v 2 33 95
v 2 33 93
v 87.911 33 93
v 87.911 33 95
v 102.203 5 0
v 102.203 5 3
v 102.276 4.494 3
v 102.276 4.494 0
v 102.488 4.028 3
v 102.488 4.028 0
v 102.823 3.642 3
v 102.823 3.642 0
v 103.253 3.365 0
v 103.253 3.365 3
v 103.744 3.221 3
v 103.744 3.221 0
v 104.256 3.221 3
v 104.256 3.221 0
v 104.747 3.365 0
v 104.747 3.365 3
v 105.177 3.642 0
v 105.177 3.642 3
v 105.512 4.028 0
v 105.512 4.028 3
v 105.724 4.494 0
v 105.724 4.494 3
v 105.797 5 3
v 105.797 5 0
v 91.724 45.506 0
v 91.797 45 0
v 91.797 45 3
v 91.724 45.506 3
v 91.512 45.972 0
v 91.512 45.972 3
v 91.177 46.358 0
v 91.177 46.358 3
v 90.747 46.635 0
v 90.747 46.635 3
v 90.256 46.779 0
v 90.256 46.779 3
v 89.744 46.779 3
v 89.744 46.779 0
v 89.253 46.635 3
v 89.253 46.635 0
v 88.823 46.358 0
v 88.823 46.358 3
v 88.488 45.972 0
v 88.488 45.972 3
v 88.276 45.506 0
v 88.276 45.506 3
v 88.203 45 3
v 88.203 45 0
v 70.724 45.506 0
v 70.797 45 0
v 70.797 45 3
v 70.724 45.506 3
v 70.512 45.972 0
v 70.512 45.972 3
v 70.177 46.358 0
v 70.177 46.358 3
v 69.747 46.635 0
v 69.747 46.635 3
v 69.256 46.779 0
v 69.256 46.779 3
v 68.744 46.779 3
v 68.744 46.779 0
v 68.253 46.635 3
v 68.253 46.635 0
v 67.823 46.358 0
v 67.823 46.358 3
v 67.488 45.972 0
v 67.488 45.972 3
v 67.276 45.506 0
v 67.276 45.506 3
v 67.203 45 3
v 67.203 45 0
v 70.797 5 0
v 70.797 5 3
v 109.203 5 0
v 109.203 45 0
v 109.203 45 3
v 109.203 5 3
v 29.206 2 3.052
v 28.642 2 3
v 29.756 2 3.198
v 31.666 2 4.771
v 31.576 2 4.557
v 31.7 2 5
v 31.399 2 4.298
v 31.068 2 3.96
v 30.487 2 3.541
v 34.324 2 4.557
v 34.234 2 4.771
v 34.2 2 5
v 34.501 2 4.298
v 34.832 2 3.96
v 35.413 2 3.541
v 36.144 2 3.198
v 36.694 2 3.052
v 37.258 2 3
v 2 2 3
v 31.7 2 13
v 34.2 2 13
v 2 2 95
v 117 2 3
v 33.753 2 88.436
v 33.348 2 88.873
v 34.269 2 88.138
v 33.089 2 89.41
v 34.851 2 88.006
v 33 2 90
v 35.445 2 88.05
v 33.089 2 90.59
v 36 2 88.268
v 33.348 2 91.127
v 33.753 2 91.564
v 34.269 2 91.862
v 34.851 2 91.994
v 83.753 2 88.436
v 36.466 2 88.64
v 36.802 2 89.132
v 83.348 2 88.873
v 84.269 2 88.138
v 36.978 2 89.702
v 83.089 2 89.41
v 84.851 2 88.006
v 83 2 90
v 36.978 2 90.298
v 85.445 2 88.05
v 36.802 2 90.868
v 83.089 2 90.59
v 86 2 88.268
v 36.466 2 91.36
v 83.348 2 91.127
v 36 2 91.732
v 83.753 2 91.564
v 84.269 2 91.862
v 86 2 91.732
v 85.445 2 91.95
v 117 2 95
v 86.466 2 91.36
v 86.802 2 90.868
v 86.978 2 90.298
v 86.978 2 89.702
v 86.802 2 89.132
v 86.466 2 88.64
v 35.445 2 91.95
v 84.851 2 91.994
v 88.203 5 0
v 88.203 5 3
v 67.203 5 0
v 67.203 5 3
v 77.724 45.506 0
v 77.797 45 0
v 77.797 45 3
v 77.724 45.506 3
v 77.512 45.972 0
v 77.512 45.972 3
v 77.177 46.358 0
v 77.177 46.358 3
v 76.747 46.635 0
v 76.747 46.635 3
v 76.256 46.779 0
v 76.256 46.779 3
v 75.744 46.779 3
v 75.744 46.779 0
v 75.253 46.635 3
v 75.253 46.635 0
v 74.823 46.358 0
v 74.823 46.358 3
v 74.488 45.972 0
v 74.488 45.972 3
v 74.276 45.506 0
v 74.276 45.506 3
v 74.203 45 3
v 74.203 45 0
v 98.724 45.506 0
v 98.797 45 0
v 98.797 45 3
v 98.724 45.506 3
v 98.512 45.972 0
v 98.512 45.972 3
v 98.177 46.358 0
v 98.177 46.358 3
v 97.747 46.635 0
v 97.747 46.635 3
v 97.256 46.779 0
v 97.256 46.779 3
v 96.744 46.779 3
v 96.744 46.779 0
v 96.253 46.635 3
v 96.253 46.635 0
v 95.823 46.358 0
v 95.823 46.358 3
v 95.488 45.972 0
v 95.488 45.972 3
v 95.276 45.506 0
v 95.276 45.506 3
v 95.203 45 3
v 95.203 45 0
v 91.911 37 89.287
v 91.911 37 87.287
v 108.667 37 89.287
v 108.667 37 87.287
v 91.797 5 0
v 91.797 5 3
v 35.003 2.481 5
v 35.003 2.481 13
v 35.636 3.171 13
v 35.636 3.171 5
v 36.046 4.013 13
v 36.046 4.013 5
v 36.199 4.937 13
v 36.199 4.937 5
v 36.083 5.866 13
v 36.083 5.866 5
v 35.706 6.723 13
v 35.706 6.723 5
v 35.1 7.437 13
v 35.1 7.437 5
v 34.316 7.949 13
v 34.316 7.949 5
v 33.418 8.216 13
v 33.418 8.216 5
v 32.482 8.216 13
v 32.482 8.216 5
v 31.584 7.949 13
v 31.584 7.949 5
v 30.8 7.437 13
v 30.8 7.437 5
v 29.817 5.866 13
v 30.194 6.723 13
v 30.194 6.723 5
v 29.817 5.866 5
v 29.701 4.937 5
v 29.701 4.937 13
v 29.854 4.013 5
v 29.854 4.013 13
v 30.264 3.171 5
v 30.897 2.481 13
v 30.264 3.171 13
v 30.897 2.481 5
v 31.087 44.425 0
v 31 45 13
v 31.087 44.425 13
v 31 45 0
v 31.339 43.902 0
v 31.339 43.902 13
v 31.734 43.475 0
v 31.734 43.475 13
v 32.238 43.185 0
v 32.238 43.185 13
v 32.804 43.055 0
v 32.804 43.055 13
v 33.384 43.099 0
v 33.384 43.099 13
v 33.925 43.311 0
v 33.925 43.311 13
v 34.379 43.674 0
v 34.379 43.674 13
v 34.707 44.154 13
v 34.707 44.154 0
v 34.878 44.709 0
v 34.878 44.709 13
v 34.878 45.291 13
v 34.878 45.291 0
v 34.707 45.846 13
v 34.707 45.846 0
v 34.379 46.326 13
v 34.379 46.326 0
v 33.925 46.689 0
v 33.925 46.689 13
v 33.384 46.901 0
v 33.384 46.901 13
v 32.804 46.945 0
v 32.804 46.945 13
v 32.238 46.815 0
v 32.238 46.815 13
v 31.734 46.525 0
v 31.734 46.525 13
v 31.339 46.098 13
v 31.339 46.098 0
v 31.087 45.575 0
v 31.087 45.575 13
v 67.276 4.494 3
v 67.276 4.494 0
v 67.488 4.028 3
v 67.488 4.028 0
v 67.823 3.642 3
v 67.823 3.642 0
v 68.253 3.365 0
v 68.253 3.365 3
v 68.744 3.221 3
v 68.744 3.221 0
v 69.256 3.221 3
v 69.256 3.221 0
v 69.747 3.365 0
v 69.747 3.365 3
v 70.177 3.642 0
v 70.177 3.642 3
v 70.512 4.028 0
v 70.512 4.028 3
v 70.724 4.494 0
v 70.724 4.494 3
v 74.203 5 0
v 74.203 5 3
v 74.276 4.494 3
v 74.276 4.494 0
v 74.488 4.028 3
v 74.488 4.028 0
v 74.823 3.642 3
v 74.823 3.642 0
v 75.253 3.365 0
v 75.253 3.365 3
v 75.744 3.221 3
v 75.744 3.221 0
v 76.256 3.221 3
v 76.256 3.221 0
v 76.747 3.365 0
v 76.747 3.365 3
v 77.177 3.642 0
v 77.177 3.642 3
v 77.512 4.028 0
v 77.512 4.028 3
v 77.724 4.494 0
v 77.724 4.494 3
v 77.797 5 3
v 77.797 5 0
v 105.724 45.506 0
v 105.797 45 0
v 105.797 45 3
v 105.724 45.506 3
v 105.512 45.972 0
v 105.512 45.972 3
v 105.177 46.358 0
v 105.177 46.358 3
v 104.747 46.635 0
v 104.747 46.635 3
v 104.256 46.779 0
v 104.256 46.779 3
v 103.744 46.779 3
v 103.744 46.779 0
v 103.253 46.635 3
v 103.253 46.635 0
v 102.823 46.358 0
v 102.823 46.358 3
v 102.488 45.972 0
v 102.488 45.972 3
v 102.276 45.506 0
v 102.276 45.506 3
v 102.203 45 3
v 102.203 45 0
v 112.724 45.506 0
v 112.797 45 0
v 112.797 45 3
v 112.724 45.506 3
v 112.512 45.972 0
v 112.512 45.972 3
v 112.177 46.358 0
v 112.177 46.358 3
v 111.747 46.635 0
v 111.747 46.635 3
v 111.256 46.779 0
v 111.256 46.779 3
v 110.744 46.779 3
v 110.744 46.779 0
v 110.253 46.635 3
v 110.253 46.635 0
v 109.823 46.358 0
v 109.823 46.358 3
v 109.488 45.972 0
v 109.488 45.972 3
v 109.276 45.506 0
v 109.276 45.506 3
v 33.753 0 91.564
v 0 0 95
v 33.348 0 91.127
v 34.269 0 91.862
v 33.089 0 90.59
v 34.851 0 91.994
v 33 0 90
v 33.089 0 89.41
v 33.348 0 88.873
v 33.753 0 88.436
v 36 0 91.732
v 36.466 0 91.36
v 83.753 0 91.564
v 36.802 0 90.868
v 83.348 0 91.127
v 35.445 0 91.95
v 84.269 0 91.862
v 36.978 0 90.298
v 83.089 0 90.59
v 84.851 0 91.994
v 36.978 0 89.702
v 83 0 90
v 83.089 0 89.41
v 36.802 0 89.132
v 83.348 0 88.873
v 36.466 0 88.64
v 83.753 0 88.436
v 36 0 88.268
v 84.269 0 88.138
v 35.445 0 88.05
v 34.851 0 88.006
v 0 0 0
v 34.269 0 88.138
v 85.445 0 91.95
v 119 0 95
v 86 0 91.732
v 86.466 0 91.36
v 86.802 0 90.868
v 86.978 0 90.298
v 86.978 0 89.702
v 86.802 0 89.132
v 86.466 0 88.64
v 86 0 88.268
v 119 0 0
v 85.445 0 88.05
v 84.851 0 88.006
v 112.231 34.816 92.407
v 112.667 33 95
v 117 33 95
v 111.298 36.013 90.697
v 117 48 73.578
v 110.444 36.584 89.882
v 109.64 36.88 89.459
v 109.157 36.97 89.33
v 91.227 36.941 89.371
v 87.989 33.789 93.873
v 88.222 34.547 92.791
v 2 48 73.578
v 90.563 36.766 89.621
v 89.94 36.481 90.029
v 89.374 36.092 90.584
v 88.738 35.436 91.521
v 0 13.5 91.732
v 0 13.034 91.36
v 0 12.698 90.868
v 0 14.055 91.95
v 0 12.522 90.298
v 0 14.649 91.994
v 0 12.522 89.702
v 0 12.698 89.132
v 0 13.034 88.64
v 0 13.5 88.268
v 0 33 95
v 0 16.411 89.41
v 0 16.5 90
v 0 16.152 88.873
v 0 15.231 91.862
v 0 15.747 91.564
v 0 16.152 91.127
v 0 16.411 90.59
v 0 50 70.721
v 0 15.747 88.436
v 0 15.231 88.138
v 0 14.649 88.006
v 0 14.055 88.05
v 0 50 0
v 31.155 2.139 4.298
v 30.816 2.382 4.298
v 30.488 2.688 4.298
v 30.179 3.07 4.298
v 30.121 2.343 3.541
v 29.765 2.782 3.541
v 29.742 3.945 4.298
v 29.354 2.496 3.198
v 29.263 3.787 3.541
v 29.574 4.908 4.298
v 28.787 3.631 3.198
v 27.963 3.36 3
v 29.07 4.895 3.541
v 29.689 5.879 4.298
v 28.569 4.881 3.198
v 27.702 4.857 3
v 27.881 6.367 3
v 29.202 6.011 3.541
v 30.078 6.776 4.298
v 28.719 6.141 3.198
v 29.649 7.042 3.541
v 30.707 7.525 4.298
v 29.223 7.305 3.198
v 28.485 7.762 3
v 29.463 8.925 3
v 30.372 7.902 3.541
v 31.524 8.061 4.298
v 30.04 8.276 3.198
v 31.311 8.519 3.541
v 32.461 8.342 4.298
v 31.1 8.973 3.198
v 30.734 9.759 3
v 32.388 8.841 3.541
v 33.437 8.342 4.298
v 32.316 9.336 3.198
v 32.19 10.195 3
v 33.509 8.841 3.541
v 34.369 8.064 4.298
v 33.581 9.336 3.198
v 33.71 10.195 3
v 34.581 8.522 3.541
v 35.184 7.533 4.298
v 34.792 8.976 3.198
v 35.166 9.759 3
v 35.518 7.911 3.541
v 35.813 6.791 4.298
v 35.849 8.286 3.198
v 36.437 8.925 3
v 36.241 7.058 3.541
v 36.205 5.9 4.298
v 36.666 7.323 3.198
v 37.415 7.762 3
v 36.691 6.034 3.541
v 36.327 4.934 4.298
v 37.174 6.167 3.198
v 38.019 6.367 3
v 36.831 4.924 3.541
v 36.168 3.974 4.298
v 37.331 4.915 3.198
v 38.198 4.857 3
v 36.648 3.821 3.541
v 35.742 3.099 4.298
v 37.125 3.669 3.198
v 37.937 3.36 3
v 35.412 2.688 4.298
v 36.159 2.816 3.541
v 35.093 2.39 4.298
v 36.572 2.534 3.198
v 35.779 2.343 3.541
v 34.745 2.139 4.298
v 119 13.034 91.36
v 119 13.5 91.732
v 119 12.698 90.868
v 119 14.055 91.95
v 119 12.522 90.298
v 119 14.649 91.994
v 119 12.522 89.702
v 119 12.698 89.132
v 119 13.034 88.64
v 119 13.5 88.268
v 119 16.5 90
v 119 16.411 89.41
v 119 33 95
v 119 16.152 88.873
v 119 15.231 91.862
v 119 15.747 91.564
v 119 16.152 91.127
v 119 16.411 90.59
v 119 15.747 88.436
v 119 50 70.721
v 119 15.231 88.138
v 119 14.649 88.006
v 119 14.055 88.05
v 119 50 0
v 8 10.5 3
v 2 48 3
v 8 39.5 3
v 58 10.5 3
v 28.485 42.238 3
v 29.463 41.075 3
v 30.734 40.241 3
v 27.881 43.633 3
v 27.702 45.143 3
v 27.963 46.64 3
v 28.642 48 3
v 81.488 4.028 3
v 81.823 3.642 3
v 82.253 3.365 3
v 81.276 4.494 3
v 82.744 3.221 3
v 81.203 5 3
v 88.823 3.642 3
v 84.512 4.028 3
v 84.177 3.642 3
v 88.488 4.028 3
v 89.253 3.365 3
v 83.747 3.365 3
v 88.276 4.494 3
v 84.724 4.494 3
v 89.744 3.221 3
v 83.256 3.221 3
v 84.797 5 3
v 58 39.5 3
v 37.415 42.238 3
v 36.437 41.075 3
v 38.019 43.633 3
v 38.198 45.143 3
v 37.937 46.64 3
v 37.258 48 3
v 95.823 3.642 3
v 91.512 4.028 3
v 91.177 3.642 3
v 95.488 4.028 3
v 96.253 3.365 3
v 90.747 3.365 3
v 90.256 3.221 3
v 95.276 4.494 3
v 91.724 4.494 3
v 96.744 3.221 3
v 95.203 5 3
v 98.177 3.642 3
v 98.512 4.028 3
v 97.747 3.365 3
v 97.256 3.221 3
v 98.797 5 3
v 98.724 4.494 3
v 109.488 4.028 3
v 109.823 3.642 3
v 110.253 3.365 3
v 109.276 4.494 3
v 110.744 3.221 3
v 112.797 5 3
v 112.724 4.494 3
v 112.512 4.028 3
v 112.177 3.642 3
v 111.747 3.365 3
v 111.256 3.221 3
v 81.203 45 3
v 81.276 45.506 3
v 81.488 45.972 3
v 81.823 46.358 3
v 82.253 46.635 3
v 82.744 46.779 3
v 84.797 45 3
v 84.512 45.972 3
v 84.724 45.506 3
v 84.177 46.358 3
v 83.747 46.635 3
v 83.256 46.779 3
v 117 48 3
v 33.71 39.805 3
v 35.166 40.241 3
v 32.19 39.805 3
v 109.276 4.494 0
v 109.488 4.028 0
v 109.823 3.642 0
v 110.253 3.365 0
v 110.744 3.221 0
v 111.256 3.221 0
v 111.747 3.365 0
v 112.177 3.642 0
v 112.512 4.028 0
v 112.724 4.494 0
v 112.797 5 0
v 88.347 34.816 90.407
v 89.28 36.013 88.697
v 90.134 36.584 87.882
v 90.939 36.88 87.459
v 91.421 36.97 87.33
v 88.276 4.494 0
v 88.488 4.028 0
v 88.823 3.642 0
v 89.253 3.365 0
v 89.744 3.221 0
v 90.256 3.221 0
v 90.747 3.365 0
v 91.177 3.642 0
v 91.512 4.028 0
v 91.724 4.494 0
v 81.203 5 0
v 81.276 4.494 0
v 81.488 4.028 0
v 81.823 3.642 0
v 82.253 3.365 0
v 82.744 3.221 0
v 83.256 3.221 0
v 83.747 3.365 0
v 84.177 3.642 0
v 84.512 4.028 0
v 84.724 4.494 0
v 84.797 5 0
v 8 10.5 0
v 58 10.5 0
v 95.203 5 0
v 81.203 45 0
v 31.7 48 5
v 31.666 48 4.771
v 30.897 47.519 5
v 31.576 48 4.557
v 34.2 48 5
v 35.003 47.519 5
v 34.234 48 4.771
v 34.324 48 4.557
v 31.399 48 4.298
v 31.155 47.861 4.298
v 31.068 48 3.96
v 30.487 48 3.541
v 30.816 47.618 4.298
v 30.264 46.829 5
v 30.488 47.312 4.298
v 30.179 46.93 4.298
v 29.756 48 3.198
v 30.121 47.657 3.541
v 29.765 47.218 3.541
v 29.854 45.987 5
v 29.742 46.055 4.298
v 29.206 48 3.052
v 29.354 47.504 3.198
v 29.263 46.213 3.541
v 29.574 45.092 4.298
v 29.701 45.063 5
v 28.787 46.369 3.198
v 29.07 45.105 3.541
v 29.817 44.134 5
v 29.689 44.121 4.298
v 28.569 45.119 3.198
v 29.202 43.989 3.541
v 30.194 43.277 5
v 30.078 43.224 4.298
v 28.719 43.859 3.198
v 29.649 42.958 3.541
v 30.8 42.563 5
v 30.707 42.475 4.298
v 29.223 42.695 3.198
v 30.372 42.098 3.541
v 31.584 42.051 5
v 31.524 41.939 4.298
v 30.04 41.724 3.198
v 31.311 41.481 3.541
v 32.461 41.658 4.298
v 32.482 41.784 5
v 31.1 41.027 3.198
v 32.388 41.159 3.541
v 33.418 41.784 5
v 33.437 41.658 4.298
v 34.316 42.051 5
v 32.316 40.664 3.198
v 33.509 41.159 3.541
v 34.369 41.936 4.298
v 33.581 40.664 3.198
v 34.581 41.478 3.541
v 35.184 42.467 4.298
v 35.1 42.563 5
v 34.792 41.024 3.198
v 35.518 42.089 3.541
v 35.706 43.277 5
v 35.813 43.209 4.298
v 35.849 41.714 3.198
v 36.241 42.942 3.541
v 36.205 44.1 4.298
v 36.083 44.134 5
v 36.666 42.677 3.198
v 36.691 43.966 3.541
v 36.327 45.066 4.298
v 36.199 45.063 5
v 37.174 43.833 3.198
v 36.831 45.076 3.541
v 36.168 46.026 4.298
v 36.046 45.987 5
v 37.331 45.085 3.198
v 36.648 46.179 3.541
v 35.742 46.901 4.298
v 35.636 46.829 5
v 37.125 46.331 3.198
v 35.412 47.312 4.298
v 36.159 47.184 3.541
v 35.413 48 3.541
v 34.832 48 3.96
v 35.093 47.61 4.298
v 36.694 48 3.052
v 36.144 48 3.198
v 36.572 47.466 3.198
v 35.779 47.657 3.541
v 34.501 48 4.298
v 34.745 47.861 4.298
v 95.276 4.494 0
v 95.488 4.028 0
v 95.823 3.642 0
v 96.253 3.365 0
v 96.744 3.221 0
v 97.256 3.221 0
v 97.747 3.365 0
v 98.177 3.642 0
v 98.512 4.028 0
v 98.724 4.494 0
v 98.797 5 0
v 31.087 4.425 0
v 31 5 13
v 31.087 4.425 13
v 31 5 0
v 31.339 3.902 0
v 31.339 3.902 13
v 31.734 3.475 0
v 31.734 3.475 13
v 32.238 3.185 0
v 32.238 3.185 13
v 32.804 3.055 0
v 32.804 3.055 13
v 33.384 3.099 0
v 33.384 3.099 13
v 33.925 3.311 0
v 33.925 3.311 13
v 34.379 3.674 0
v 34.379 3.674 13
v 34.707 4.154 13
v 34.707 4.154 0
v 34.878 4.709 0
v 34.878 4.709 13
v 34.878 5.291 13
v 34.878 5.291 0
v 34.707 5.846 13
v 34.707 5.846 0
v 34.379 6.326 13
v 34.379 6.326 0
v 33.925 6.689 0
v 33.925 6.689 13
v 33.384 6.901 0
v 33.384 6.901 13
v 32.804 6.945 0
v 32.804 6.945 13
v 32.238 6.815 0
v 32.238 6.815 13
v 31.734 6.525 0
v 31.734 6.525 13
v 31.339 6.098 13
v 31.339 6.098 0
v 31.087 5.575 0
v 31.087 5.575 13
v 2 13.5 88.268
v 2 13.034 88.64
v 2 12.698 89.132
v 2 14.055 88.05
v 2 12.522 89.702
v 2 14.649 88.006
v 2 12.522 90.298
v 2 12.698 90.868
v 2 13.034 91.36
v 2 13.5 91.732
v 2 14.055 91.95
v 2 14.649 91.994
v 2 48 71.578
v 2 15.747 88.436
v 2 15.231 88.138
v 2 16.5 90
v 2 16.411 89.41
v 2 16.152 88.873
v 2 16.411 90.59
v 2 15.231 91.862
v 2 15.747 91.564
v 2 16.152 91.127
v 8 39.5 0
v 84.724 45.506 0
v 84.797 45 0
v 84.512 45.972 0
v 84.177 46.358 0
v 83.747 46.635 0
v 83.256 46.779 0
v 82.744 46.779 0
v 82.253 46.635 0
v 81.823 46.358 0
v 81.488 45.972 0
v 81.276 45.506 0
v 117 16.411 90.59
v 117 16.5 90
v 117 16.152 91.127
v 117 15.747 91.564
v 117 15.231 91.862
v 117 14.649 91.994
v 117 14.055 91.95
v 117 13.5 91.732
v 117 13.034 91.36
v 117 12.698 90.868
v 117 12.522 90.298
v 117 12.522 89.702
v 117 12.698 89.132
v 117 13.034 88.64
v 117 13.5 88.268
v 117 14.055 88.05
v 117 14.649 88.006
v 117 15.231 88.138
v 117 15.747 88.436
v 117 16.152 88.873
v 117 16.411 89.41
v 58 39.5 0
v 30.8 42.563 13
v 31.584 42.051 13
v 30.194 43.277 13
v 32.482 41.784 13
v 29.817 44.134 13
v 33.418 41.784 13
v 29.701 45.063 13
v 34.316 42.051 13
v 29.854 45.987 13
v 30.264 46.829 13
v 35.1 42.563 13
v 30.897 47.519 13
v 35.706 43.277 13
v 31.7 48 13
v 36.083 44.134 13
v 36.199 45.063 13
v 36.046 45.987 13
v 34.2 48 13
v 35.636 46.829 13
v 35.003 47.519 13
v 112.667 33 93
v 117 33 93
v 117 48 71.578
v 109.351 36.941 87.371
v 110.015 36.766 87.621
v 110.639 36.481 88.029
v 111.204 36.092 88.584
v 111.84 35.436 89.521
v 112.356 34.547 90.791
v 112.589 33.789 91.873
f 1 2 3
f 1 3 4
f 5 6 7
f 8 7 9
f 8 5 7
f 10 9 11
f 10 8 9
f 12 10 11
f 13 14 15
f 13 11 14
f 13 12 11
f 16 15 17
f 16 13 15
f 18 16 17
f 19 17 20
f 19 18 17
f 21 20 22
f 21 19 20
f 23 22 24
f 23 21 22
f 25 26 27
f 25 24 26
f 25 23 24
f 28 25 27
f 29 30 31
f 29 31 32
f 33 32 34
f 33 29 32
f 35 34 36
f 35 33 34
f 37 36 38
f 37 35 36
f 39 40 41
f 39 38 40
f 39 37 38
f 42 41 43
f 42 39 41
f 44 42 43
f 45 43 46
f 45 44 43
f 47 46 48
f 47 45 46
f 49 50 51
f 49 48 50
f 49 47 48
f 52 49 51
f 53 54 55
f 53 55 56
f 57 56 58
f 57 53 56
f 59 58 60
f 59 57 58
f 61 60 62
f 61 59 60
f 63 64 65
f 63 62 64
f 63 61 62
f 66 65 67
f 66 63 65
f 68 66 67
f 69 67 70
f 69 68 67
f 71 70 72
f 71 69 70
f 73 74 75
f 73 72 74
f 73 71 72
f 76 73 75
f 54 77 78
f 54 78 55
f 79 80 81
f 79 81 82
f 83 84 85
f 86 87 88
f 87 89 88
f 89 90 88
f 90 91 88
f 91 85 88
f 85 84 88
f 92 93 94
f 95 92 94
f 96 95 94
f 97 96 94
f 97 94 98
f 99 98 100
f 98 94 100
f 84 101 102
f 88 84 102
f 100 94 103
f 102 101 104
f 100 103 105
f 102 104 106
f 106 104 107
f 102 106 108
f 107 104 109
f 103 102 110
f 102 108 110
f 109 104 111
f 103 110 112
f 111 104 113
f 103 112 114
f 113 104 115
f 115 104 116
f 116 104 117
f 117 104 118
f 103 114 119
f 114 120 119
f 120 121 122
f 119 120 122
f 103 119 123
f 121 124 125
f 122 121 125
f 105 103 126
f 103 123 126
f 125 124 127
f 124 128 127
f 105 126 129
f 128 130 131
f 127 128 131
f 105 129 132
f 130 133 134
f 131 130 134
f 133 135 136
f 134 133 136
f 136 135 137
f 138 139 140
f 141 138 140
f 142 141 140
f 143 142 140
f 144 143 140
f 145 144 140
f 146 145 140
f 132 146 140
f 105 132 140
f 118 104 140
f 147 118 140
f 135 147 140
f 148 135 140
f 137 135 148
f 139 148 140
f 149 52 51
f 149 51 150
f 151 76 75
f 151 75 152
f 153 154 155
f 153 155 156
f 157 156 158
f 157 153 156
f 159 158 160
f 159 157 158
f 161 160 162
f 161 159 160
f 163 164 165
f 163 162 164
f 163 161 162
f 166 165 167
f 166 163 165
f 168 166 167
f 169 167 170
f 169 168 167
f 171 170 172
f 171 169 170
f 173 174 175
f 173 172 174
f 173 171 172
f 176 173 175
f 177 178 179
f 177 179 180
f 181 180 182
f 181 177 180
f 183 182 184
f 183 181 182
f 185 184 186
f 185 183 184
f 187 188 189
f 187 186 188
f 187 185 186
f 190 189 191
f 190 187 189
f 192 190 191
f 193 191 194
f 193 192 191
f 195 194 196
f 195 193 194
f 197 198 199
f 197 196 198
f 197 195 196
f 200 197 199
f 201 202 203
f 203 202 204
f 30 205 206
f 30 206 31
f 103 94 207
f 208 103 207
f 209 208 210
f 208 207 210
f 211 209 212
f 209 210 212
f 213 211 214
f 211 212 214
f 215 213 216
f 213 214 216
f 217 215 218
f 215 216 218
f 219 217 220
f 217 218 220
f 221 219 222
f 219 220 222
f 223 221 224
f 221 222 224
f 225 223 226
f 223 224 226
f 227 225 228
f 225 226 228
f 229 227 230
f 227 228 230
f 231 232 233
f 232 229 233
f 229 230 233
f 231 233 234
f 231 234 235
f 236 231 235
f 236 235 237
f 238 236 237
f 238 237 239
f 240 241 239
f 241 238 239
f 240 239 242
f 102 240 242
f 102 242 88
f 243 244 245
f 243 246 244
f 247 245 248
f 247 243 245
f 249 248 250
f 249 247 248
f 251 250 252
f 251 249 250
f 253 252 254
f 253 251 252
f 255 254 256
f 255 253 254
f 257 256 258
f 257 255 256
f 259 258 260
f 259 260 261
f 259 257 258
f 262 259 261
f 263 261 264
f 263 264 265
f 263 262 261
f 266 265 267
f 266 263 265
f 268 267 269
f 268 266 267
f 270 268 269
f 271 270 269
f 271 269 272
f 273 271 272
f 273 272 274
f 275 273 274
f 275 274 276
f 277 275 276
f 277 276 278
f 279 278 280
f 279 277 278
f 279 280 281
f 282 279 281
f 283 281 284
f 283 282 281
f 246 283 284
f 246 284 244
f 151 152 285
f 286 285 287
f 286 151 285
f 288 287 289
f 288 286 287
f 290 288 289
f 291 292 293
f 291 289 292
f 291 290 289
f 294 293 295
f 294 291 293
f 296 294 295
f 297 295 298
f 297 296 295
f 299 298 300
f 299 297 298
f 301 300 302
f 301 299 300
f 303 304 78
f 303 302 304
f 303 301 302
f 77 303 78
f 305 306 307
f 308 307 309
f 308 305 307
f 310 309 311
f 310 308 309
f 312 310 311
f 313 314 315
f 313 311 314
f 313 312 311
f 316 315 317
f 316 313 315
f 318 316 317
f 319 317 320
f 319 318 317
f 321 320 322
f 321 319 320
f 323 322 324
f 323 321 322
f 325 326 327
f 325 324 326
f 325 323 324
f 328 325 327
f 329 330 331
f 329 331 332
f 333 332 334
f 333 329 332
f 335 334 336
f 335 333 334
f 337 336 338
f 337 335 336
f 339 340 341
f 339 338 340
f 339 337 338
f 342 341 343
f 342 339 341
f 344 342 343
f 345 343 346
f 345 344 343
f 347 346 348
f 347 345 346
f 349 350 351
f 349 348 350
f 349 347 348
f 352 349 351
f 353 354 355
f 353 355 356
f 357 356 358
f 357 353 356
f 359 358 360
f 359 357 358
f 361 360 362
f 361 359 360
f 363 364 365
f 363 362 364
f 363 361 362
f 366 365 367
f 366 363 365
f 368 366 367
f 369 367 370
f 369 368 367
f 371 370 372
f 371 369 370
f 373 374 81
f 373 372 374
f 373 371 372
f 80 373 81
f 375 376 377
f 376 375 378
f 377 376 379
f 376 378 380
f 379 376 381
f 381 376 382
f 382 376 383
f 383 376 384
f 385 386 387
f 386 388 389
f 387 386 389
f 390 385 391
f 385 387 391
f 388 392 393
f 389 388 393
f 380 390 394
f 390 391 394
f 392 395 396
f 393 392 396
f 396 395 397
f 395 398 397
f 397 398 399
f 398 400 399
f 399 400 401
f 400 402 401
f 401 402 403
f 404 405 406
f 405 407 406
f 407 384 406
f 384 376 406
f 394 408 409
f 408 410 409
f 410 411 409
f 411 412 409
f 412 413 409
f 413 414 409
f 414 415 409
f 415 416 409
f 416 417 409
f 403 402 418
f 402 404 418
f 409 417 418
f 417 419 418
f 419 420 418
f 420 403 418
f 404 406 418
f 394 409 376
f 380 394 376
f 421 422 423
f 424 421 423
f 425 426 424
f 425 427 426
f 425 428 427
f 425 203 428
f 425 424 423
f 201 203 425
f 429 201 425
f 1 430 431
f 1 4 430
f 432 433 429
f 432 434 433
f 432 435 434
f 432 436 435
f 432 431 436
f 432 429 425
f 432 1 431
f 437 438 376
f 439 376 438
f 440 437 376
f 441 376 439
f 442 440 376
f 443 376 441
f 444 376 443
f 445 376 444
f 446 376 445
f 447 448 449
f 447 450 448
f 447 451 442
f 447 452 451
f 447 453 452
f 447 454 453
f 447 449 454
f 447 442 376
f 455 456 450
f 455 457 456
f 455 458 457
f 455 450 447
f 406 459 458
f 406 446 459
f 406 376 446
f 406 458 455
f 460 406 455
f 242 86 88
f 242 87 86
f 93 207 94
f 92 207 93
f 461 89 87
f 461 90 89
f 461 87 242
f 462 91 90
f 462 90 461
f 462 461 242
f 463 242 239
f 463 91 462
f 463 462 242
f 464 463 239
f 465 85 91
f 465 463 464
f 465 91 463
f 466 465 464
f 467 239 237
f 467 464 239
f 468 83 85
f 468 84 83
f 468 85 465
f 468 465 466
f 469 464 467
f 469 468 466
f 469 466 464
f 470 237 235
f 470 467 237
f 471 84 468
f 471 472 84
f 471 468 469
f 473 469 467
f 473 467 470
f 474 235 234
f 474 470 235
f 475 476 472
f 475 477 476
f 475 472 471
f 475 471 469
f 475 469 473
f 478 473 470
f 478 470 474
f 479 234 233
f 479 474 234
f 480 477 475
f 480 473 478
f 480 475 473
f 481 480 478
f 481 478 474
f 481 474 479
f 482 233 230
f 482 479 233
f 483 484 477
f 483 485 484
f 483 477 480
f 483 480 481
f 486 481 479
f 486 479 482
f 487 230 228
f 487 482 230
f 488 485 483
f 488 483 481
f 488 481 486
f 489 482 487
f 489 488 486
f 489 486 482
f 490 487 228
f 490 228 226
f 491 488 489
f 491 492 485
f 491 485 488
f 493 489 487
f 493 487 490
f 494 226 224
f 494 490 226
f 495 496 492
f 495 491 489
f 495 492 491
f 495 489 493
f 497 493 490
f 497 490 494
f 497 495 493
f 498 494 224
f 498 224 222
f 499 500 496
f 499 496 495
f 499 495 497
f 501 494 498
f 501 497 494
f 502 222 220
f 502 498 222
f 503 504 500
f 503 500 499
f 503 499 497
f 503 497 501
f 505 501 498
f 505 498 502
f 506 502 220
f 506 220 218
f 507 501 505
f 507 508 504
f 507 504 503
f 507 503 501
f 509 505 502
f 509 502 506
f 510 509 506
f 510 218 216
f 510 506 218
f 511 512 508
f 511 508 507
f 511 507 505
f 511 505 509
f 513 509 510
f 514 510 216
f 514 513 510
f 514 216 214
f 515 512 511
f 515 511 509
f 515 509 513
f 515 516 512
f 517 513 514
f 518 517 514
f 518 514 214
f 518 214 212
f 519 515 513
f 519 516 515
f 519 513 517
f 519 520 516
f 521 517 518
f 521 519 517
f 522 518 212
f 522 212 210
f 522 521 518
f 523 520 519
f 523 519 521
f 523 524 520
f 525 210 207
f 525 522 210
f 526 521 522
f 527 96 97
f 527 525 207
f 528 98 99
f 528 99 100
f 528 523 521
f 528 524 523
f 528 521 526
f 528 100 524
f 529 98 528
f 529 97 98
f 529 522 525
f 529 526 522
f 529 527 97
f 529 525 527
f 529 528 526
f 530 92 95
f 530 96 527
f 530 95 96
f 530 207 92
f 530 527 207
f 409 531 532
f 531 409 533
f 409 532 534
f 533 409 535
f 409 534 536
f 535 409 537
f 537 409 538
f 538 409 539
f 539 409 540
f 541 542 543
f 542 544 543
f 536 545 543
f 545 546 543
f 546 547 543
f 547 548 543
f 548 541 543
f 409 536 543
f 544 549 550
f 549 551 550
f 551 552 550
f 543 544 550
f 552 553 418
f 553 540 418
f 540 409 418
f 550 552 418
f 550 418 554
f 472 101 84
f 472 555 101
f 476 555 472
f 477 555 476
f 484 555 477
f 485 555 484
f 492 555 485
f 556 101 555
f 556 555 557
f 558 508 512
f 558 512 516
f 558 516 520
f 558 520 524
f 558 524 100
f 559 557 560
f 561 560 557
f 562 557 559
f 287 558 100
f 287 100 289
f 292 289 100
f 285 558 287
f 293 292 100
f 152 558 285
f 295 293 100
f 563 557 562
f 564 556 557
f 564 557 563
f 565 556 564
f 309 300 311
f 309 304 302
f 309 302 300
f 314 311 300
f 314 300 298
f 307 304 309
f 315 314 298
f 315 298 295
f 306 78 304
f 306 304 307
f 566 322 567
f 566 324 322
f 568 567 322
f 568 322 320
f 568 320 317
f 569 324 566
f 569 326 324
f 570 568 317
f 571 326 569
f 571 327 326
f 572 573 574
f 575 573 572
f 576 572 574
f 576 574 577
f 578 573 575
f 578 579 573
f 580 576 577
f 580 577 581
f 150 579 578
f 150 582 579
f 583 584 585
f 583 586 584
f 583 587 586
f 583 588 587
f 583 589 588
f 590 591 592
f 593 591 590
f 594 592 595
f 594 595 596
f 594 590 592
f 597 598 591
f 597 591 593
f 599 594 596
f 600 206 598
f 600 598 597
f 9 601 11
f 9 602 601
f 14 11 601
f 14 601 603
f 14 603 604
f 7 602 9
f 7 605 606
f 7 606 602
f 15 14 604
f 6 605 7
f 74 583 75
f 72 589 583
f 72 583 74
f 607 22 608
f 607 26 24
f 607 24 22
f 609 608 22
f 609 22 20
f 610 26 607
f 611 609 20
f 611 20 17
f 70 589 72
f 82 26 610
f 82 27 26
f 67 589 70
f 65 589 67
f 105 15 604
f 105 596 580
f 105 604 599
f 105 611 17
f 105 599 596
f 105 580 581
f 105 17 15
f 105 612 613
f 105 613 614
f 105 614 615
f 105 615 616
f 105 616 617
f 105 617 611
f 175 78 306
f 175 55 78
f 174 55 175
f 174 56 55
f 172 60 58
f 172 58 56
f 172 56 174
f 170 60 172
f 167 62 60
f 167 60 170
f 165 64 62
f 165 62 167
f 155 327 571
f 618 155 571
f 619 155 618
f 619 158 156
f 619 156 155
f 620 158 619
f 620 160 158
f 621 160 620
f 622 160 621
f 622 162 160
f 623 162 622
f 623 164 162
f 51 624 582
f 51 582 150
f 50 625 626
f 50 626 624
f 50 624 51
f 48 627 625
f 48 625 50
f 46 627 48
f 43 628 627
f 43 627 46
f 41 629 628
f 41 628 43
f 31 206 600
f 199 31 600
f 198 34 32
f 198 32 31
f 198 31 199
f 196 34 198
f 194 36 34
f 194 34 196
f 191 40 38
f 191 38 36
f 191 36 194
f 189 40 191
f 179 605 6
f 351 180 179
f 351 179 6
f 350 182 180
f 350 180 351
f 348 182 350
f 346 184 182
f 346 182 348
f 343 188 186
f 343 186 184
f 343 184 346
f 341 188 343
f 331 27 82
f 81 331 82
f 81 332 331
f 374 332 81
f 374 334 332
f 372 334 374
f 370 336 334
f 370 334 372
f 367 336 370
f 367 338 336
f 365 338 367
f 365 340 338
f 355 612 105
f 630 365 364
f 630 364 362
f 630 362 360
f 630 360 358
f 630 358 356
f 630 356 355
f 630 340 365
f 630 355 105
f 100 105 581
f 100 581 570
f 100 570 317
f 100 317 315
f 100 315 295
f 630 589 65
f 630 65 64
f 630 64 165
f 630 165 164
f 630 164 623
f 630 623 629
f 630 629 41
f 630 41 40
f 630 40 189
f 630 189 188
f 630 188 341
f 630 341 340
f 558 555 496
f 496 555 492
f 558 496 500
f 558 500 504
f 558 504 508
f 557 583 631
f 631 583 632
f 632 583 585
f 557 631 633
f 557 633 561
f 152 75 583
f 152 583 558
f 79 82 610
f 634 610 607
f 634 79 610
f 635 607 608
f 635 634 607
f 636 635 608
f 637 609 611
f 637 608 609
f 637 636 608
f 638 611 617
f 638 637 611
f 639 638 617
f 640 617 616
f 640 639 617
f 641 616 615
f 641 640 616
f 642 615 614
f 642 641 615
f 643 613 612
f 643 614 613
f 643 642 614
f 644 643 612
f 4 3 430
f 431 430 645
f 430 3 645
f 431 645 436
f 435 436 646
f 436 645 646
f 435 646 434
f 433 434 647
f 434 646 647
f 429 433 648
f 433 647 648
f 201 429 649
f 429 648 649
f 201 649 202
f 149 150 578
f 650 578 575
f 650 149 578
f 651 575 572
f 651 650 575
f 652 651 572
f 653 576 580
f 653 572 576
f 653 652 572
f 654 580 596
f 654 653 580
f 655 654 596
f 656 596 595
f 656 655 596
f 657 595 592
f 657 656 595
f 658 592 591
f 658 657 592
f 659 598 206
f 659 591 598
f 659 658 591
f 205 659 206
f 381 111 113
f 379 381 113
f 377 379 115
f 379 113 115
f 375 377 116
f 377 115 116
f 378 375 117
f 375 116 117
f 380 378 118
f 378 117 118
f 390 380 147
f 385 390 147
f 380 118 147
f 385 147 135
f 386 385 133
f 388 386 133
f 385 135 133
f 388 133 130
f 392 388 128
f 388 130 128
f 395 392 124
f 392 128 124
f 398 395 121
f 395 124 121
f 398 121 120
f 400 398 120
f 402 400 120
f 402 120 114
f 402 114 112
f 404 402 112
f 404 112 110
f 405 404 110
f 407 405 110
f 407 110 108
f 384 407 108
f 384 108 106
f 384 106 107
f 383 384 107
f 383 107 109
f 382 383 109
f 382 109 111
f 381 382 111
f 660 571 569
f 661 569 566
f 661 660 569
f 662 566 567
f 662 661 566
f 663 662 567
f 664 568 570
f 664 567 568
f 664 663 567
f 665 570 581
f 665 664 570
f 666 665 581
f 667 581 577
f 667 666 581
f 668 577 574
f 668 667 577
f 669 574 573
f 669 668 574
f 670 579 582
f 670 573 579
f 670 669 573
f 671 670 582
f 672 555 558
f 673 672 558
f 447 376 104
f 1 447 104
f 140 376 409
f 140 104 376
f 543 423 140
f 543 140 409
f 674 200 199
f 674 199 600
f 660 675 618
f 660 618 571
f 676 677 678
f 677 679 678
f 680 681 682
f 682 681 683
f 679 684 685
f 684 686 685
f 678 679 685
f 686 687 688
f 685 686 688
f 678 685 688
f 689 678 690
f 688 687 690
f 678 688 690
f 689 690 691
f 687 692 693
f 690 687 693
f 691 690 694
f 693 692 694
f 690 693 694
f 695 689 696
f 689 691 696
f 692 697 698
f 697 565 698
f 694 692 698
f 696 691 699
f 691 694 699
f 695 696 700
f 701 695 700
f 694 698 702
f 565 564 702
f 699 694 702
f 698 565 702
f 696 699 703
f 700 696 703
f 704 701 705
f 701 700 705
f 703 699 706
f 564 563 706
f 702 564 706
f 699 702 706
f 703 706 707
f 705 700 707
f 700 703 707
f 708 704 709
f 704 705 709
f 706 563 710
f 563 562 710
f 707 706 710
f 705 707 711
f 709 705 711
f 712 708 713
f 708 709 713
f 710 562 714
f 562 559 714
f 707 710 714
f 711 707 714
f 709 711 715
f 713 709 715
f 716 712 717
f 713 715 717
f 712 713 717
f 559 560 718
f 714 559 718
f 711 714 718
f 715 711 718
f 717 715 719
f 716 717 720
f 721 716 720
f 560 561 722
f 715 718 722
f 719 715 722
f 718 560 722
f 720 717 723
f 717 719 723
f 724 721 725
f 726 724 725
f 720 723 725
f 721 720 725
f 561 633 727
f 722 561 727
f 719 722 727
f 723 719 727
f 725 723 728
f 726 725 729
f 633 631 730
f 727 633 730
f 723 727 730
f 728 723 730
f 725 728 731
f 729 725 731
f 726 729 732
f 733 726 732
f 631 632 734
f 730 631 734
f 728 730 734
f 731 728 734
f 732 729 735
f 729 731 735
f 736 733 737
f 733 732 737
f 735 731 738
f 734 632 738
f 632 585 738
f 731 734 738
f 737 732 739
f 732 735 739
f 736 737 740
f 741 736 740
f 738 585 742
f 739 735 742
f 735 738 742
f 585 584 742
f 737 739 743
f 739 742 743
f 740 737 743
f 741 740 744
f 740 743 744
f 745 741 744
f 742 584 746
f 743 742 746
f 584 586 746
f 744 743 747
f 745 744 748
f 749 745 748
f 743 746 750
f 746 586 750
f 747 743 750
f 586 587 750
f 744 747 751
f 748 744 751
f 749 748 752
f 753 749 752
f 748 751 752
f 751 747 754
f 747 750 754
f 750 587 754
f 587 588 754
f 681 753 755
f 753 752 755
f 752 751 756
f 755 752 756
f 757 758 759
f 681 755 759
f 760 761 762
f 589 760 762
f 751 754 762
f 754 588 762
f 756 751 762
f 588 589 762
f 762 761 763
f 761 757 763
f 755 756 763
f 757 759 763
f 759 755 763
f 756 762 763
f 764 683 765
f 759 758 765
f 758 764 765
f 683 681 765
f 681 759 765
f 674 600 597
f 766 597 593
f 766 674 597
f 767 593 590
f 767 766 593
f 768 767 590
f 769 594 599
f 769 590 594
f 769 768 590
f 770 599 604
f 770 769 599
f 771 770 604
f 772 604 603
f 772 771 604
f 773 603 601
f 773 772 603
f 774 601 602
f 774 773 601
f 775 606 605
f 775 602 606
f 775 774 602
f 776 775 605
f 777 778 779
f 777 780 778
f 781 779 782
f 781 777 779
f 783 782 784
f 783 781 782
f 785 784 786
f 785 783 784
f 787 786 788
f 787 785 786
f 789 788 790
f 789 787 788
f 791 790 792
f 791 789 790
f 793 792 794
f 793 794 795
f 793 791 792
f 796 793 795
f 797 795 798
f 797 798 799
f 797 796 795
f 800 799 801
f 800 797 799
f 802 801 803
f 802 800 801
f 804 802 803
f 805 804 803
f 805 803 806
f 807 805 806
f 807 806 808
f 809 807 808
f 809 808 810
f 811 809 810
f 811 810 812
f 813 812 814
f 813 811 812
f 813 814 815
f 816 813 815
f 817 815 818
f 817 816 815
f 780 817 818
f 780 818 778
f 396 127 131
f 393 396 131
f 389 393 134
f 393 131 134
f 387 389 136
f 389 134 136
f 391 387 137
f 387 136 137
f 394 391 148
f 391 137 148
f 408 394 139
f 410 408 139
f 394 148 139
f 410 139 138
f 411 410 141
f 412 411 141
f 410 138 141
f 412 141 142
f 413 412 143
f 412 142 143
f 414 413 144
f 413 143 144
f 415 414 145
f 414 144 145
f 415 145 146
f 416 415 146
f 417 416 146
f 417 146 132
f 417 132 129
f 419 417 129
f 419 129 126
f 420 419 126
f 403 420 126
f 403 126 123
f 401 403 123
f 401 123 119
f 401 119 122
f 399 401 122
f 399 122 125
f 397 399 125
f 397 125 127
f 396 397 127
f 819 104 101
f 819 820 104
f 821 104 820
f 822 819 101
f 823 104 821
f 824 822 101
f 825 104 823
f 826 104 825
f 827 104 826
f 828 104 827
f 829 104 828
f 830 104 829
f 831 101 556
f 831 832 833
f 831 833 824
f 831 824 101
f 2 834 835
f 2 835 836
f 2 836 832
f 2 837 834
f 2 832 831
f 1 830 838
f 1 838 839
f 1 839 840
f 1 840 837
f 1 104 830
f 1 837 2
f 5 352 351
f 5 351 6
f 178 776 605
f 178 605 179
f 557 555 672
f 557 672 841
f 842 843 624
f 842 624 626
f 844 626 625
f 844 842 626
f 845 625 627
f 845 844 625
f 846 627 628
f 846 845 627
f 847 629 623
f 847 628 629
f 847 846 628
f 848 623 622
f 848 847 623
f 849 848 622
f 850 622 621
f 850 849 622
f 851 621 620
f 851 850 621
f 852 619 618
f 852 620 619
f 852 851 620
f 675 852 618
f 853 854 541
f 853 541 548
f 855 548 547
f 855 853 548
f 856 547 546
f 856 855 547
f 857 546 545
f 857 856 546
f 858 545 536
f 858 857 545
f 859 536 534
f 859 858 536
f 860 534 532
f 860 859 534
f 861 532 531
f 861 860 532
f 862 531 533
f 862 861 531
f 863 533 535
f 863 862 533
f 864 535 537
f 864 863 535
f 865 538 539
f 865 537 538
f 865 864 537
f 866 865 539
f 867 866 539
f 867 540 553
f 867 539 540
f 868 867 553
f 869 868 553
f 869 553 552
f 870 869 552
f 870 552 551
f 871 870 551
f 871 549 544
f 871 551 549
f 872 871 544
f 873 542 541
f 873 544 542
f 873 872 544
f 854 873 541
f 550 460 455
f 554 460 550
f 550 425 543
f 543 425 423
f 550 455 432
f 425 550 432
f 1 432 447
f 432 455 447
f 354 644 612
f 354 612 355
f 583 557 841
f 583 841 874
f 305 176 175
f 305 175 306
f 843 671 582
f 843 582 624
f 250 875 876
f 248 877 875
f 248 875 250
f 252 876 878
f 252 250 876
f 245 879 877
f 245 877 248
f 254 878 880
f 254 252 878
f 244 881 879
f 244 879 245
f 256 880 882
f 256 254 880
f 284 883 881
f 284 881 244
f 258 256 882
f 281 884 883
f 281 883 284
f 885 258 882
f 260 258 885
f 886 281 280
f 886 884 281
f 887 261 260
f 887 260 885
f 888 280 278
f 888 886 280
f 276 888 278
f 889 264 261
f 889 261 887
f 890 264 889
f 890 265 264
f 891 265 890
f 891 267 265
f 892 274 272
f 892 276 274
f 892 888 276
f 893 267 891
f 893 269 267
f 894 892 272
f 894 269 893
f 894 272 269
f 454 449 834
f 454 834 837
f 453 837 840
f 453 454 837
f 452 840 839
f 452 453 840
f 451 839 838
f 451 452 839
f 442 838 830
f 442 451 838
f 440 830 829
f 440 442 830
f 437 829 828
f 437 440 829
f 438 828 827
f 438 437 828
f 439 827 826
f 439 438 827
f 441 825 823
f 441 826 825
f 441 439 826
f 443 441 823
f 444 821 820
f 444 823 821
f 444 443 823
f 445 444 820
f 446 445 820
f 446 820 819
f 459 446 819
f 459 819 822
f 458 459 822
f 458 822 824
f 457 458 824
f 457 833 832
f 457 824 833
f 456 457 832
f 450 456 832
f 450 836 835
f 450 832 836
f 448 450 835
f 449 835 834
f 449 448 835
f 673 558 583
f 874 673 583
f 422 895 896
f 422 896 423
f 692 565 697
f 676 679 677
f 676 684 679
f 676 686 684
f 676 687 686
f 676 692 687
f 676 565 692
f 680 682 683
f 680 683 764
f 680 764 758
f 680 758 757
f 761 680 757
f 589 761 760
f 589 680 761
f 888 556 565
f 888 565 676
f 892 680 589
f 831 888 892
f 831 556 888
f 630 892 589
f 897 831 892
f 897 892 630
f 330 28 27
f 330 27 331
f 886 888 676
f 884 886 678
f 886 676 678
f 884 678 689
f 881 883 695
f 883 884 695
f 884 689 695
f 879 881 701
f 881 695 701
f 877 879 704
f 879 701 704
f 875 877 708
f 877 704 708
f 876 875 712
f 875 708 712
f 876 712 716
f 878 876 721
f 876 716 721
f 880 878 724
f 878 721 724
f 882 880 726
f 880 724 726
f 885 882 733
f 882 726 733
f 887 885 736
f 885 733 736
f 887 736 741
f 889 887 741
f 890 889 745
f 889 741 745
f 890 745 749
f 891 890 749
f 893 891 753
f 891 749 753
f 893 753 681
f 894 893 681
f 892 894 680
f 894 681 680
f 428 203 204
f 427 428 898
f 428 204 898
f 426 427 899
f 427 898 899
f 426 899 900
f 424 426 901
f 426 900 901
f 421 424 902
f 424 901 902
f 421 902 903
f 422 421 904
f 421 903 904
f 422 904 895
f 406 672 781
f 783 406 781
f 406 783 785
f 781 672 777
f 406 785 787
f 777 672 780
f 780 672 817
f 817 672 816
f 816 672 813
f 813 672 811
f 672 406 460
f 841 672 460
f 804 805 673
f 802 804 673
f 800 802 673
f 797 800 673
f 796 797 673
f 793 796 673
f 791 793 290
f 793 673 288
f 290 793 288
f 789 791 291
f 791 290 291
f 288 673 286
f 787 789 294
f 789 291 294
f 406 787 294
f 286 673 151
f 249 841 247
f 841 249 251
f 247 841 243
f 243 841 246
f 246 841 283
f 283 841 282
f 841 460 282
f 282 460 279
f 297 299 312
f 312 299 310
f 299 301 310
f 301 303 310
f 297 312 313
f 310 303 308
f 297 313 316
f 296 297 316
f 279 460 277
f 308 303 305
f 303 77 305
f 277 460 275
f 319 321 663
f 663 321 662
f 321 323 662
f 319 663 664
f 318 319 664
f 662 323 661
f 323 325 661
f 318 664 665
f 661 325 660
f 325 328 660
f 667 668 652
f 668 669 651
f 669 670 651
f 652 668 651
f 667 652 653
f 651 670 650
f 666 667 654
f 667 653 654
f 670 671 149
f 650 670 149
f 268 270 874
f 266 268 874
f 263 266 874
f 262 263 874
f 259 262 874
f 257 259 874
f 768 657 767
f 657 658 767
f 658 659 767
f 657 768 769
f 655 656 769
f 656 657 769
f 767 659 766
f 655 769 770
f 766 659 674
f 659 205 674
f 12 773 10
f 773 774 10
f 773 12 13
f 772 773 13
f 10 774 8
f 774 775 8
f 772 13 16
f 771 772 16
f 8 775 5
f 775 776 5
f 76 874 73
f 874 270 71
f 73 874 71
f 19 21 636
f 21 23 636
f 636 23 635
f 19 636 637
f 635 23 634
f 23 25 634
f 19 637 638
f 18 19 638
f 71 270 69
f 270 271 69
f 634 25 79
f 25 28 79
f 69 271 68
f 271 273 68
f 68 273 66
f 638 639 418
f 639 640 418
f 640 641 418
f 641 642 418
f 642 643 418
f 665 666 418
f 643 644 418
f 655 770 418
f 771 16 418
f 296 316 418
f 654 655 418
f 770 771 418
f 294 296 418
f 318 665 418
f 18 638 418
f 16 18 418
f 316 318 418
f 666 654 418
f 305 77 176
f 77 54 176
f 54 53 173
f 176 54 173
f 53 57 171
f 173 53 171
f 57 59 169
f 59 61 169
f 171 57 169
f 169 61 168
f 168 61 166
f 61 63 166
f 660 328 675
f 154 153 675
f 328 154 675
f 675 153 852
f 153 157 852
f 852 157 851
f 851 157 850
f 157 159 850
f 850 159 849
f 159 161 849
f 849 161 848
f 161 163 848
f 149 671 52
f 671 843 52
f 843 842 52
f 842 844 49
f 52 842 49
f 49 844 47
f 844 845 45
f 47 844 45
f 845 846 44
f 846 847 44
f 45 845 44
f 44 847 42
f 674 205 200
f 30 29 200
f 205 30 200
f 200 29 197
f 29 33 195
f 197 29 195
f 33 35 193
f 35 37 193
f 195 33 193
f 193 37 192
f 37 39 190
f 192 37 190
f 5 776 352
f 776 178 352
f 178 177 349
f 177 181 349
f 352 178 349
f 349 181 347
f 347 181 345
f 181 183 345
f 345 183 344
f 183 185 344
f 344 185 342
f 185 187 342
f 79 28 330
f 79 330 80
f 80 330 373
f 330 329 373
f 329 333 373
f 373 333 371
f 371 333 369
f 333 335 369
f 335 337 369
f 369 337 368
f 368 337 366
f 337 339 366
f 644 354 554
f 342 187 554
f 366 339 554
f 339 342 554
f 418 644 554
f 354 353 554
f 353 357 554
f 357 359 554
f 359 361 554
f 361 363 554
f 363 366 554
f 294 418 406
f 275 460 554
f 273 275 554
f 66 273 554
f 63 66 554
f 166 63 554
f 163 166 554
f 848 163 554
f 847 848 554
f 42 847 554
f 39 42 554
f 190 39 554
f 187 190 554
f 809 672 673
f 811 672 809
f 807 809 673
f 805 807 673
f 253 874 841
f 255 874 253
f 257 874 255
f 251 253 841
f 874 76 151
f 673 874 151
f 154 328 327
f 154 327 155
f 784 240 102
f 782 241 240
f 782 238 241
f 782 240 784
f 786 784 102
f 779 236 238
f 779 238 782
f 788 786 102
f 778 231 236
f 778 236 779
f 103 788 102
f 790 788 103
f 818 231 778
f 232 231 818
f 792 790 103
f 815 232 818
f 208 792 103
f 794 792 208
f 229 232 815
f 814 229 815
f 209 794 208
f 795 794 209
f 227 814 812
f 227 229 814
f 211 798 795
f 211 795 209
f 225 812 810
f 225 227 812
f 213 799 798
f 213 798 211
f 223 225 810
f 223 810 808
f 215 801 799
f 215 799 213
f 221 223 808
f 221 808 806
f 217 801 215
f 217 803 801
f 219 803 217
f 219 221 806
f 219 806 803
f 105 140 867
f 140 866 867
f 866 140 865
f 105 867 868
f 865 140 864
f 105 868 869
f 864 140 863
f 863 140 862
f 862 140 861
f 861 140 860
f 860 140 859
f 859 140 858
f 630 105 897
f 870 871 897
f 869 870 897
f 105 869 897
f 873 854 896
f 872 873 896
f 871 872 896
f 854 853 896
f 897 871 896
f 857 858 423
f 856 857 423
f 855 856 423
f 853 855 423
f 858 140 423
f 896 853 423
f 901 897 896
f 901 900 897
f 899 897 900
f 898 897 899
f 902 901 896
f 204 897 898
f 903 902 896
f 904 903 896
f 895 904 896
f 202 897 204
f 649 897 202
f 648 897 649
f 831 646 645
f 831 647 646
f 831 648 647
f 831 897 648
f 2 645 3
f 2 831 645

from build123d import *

# Parameters (mm, degrees)
SKETCH1_W               = 119
SKETCH1_H               = 50
BOSS_EXTRUDE1_DEPTH     = 95
SKETCH2_W               = 115
SKETCH2_H               = 46
CUT_EXTRUDE1_DEPTH      = 92
SKETCH3_W               = 50
SKETCH3_H               = 29
CUT_EXTRUDE2_DEPTH      = 10
SKETCH4_R               = 1.95
CUT_EXTRUDE3_DEPTH      = 10
SKETCH5_R               = 3.25
SKETCH5_R_2             = 1.95
BOSS_EXTRUDE3_DEPTH     = 10
FILLET1_R               = 2
SKETCH6_R               = 2
CUT_EXTRUDE4_DEPTH      = 10
CUT_EXTRUDE5_DEPTH      = 159.789168456
CUT_EXTRUDE5_DEPTH_BACK = 159.789168456
SKETCH8_R               = 2
BOSS_EXTRUDE4_DEPTH     = 115
CUT_EXTRUDE6_DEPTH      = 159.789168456
CUT_EXTRUDE6_DEPTH_BACK = 159.789168456
CUT_EXTRUDE8_DEPTH      = 10
CUT_EXTRUDE9_DEPTH      = 155.550962524


with BuildPart() as part:
    # Sketch1 → Boss-Extrude1 (new body)
    with BuildSketch(Plane.XY):
        with Locations((59.5, 25)):
            Rectangle(SKETCH1_W, SKETCH1_H)
    extrude(amount=BOSS_EXTRUDE1_DEPTH)

    # Sketch2 → Cut-Extrude1 (cut)
    with BuildSketch(Plane.XY.offset(95)):
        with Locations((59.5, 25)):
            Rectangle(SKETCH2_W, SKETCH2_H)
    extrude(amount=-CUT_EXTRUDE1_DEPTH, mode=Mode.SUBTRACT)

    # Sketch3 → Cut-Extrude2 (cut)
    with BuildSketch(Plane.XY.offset(3)):
        with Locations((33, 25)):
            Rectangle(SKETCH3_W, SKETCH3_H)
    extrude(amount=-CUT_EXTRUDE2_DEPTH, mode=Mode.SUBTRACT)

    # Sketch4 → Cut-Extrude3 (cut)
    with BuildSketch(Plane(origin=(0, 0, 0), x_dir=(-1, 0, 0), z_dir=(0, 0, -1))):
        with Locations((-32.95, 45)):
            Circle(SKETCH4_R)
        with Locations((-32.95, 5)):
            Circle(SKETCH4_R)
    extrude(amount=-CUT_EXTRUDE3_DEPTH, mode=Mode.SUBTRACT)

    # Sketch5 → Boss-Extrude3 (add)
    # profile 1 of 2: a face of its own
    with BuildSketch(Plane.XY.offset(3)):
        with Locations((32.95, 45)):
            Circle(SKETCH5_R)
        with Locations(Location((32.95, 45, 0), (0, 0, 180))):
            Circle(SKETCH5_R_2, mode=Mode.SUBTRACT)
    # profile 2 of 2: a face of its own
    with BuildSketch(Plane.XY.offset(3)):
        with Locations((32.95, 5)):
            Circle(SKETCH5_R)
        with Locations(Location((32.95, 5, 0), (0, 0, 180))):
            Circle(SKETCH5_R_2, mode=Mode.SUBTRACT)
    extrude(amount=BOSS_EXTRUDE3_DEPTH)

    # Fillet1
    fillet1_edges = [part.edges().sort_by_distance(p)[0] for p in [
        (31.147224362, 42.295836543, 3),
        (31.147224362, 7.704163457, 3),
    ]]
    fillet(fillet1_edges, radius=FILLET1_R)

    # Sketch6 → Cut-Extrude4 (cut)
    with BuildSketch(Plane(origin=(0, 2, 0), x_dir=(1, 0, 0), z_dir=(0, 1, 0))):
        with Locations(Location((85, -90, 0), (0, 0, 180))):
            Circle(SKETCH6_R)
        with Locations(Location((35, -90, 0), (0, 0, 180))):
            Circle(SKETCH6_R)
    extrude(amount=-CUT_EXTRUDE4_DEPTH, mode=Mode.SUBTRACT)

    # Sketch8 → Cut-Extrude5 (cut, two sides: drawn at the far end of the back side and taken through both)
    with BuildSketch(Plane(origin=(2, 0, 0), x_dir=(0, 0, -1), z_dir=(1, 0, 0)).offset(-CUT_EXTRUDE5_DEPTH_BACK)):
        with Locations(Location((-90, 14.5, 0), (0, 0, 90))):
            Circle(SKETCH8_R)
    extrude(amount=CUT_EXTRUDE5_DEPTH + CUT_EXTRUDE5_DEPTH_BACK, mode=Mode.SUBTRACT)

    # Sketch9 → Boss-Extrude4 (add)
    with BuildSketch(Plane(origin=(2, 0, 0), x_dir=(0, 0, -1), z_dir=(1, 0, 0))):
        Polygon((-95, 33), (-73.577779899, 48), (-71.577779899, 48), (-93, 33), align=None)
    extrude(amount=BOSS_EXTRUDE4_DEPTH)

    # Sketch10 → Cut-Extrude6 (cut, two sides: drawn at the far end of the back side and taken through both)
    with BuildSketch(Plane(origin=(2, 0, 0), x_dir=(0, 0, -1), z_dir=(1, 0, 0)).offset(-CUT_EXTRUDE6_DEPTH_BACK)):
        Polygon((-95, 33), (-95, 50), (-70.721483885, 50), align=None)
    extrude(amount=CUT_EXTRUDE6_DEPTH + CUT_EXTRUDE6_DEPTH_BACK, mode=Mode.SUBTRACT)

    # Sketch11 → Cut-Extrude8 (cut)
    with BuildSketch(Plane(origin=(0, 0, 0), x_dir=(-1, 0, 0), z_dir=(0, 0, -1))):
        with BuildLine():
            Line((-109.202811856, 45), (-109.202811856, 5))
            ThreePointArc((-109.202811856, 5), (-111, 3.202811856), (-112.797188144, 5))
            Line((-112.797188144, 5), (-112.797188144, 45))
            ThreePointArc((-112.797188144, 45), (-111, 46.797188144), (-109.202811856, 45))
        make_face()
        with BuildLine():
            Line((-102.202811856, 45), (-102.202811856, 5))
            ThreePointArc((-102.202811856, 5), (-104, 3.202811856), (-105.797188144, 5))
            Line((-105.797188144, 5), (-105.797188144, 45))
            ThreePointArc((-105.797188144, 45), (-104, 46.797188144), (-102.202811856, 45))
        make_face()
        with BuildLine():
            Line((-95.202811856, 45), (-95.202811856, 5))
            ThreePointArc((-95.202811856, 5), (-97, 3.202811856), (-98.797188144, 5))
            Line((-98.797188144, 5), (-98.797188144, 45))
            ThreePointArc((-98.797188144, 45), (-97, 46.797188144), (-95.202811856, 45))
        make_face()
        with BuildLine():
            Line((-88.202811856, 45), (-88.202811856, 5))
            ThreePointArc((-88.202811856, 5), (-90, 3.202811856), (-91.797188144, 5))
            Line((-91.797188144, 5), (-91.797188144, 45))
            ThreePointArc((-91.797188144, 45), (-90, 46.797188144), (-88.202811856, 45))
        make_face()
        with BuildLine():
            Line((-81.202811856, 45), (-81.202811856, 5))
            ThreePointArc((-81.202811856, 5), (-83, 3.202811856), (-84.797188144, 5))
            Line((-84.797188144, 5), (-84.797188144, 45))
            ThreePointArc((-84.797188144, 45), (-83, 46.797188144), (-81.202811856, 45))
        make_face()
        with BuildLine():
            Line((-74.202811856, 45), (-74.202811856, 5))
            ThreePointArc((-74.202811856, 5), (-76, 3.202811856), (-77.797188144, 5))
            Line((-77.797188144, 5), (-77.797188144, 45))
            ThreePointArc((-77.797188144, 45), (-76, 46.797188144), (-74.202811856, 45))
        make_face()
        with BuildLine():
            Line((-67.202811856, 45), (-67.202811856, 5))
            ThreePointArc((-67.202811856, 5), (-69, 3.202811856), (-70.797188144, 5))
            Line((-70.797188144, 5), (-70.797188144, 45))
            ThreePointArc((-70.797188144, 45), (-69, 46.797188144), (-67.202811856, 45))
        make_face()
    extrude(amount=-CUT_EXTRUDE8_DEPTH, mode=Mode.SUBTRACT)

    # Sketch12 → Cut-Extrude9 (cut, through all)
    with BuildSketch(Plane.XY.offset(10)):
        with BuildLine():
            Line((108.667383108, 29), (91.910743178, 29))
            ThreePointArc((91.910743178, 29), (87.910743178, 33), (91.910743178, 37))
            Line((91.910743178, 37), (108.667383108, 37))
            ThreePointArc((108.667383108, 37), (112.667383108, 33), (108.667383108, 29))
        make_face()
    extrude(amount=CUT_EXTRUDE9_DEPTH, mode=Mode.SUBTRACT)


solid = part.part
